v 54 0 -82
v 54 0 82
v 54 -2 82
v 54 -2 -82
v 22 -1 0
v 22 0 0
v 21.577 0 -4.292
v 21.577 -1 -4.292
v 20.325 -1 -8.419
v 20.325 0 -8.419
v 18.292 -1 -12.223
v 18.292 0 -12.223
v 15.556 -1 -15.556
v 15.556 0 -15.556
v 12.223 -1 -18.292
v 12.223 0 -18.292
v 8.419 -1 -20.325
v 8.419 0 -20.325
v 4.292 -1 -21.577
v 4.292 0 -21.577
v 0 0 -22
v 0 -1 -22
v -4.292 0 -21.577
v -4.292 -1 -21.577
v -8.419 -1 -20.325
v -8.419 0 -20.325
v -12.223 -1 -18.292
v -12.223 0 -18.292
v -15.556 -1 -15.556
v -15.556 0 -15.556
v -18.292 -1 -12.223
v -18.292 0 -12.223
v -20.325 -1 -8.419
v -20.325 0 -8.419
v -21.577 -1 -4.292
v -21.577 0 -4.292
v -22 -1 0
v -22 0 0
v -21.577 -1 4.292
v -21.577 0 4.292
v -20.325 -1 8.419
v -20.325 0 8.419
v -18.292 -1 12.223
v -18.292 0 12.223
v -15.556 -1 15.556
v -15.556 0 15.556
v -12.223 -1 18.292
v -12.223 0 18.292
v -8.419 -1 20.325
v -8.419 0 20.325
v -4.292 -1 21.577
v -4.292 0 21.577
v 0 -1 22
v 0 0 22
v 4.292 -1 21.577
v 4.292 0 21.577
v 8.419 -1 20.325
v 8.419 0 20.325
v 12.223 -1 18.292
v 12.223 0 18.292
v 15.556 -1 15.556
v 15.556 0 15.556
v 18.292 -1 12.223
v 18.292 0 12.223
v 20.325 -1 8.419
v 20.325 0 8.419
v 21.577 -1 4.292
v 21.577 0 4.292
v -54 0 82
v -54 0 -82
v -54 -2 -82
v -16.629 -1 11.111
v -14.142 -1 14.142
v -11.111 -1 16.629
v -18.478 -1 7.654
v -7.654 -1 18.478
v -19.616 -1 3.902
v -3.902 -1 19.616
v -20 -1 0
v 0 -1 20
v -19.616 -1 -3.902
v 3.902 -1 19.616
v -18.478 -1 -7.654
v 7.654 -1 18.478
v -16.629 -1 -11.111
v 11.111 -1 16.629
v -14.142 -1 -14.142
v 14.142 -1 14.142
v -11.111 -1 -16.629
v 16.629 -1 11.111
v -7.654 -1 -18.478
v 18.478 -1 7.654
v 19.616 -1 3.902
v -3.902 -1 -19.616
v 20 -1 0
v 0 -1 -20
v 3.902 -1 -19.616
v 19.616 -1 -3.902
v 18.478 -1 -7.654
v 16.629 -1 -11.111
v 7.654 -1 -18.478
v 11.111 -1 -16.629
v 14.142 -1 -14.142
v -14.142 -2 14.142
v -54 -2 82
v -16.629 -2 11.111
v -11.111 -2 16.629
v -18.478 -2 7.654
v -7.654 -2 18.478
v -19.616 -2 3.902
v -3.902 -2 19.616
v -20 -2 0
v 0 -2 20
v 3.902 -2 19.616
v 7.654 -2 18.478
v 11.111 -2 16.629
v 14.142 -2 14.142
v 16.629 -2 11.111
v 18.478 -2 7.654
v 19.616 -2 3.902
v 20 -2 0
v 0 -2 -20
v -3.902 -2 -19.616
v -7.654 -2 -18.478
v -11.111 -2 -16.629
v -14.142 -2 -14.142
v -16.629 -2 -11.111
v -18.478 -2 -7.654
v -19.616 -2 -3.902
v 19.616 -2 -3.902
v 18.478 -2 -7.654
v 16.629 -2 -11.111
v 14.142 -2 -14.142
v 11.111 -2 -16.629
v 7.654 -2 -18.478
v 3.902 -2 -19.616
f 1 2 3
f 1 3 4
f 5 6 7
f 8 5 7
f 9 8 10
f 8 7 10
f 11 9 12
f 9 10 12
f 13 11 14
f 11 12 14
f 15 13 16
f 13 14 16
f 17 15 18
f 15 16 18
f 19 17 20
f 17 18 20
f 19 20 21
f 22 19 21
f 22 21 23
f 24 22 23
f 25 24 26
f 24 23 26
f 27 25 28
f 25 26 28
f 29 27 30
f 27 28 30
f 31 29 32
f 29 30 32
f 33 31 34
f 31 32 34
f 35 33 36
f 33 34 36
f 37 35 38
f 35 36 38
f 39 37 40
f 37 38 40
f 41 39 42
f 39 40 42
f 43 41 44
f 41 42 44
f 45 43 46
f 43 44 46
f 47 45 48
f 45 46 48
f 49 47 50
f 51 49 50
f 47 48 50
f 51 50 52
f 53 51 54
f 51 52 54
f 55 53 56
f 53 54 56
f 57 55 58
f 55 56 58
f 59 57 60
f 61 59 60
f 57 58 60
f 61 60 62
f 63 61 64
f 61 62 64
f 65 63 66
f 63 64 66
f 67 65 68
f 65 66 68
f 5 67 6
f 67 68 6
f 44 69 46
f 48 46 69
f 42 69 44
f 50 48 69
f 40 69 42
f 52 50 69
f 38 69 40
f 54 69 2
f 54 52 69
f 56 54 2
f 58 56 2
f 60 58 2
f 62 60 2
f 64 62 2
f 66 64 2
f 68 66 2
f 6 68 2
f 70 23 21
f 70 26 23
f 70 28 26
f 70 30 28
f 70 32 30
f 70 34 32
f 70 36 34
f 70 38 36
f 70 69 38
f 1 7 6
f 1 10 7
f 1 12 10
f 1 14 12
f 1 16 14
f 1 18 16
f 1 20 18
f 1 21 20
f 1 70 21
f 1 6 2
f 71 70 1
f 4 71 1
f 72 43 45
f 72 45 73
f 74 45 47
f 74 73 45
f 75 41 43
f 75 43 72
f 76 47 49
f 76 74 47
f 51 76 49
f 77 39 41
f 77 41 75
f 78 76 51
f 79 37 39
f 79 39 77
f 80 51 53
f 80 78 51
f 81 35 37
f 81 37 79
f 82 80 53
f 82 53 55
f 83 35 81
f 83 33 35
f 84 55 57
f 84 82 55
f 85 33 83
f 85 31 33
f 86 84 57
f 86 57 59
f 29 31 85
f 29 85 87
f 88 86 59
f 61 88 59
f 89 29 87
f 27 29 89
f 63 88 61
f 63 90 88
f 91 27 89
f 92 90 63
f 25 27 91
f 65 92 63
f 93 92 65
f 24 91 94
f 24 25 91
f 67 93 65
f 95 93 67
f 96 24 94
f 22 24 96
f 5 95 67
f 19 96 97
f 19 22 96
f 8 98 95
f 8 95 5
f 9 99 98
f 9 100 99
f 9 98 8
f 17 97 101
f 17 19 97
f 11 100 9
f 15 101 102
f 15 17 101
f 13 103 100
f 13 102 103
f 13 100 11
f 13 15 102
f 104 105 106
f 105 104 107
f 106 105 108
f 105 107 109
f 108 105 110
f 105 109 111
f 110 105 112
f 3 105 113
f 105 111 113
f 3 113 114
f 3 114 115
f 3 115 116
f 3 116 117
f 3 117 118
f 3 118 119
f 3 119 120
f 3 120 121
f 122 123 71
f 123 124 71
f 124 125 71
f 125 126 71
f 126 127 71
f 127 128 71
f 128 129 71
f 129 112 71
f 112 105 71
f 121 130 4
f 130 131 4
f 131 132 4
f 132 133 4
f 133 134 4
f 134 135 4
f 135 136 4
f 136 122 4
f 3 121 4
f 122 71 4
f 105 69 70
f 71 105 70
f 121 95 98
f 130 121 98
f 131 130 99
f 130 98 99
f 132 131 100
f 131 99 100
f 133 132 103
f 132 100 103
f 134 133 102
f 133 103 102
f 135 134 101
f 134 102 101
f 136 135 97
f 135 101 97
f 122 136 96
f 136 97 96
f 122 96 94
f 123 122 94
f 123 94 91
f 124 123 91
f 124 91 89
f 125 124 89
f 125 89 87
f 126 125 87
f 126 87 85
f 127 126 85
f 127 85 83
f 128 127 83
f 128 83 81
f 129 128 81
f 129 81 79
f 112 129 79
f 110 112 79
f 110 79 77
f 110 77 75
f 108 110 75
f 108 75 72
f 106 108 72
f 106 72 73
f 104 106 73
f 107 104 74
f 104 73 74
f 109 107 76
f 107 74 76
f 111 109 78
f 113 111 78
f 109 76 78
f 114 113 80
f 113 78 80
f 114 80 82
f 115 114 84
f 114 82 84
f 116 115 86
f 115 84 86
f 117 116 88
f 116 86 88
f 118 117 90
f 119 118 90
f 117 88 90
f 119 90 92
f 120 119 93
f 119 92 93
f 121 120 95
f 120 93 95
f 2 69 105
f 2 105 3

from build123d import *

# Parameters (mm, degrees)
SKETCH1_W           = 108
SKETCH1_H           = 164
BOSS_EXTRUDE1_DEPTH = 2
SKETCH2_R           = 22
CUT_EXTRUDE1_DEPTH  = 1
SKETCH3_R           = 20
CUT_EXTRUDE2_DEPTH  = 2


with BuildPart() as part:
    # Sketch1 → Boss-Extrude1 (new body)
    with BuildSketch(Plane(origin=(0, 0, 0), x_dir=(1, 0, 0), z_dir=(0, 1, 0))):
        Rectangle(SKETCH1_W, SKETCH1_H)
    extrude(amount=-BOSS_EXTRUDE1_DEPTH)

    # Sketch2 → Cut-Extrude1 (cut)
    with BuildSketch(Plane(origin=(0, 0, 0), x_dir=(1, 0, 0), z_dir=(0, 1, 0))):
        Circle(SKETCH2_R)
    extrude(amount=-CUT_EXTRUDE1_DEPTH, mode=Mode.SUBTRACT)

    # Sketch3 → Cut-Extrude2 (cut, through all)
    with BuildSketch(Plane(origin=(0, -1, 0), x_dir=(1, 0, 0), z_dir=(0, 1, 0))):
        Circle(SKETCH3_R)
    extrude(amount=-CUT_EXTRUDE2_DEPTH, mode=Mode.SUBTRACT)


solid = part.part
